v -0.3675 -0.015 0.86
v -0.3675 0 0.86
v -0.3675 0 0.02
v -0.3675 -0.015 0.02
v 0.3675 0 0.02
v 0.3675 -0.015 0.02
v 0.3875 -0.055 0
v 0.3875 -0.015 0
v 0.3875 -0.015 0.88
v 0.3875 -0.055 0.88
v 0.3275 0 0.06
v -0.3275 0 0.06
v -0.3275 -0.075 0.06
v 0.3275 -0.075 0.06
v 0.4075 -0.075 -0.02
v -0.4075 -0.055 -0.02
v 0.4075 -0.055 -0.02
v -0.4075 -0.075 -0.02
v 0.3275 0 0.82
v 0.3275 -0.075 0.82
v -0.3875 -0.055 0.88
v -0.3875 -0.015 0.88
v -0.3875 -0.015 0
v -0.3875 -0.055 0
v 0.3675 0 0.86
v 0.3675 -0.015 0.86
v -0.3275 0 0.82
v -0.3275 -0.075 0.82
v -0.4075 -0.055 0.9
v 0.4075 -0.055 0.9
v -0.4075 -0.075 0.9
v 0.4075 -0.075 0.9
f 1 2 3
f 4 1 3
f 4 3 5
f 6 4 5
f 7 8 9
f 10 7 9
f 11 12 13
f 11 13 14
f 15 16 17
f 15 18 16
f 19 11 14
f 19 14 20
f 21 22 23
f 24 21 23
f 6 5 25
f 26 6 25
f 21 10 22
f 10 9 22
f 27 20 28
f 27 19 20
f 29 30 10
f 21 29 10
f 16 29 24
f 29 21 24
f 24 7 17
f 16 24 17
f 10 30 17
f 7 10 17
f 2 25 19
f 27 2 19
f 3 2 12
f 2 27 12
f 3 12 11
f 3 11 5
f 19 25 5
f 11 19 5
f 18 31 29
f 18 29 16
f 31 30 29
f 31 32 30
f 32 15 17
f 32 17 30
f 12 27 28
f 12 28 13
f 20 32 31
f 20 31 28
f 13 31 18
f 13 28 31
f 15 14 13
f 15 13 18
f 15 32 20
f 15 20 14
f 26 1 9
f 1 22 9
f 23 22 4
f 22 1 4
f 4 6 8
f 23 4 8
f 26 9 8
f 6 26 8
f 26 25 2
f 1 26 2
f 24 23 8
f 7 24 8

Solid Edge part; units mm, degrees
sketch "Sketch1" plane through (0, 0, 0) normal (0, -1, 0) x (1, 0, 0)
  line L0 (-0.3875, 0) -> (0.3875, 0)
  line L1 (0.3875, 0) -> (0.3875, 0.88)
  line L2 (0.3875, 0.88) -> (-0.3875, 0.88)
  line L3 (-0.3875, 0.88) -> (-0.3875, 0)
  dimension "D1" = 0.88
  dimension "D2" = 0.775
extrude "Protrusion1" add sketch "Sketch1" along normal blind 0.075
sketch "Sketch2" plane through (0, 0, 0.69) normal (0, 1, 0) x (-1, 0, 0)
  line L0 (-0.3275, 0.13) -> (0.3275, 0.13)
  line L1 (0.3275, 0.13) -> (0.3275, -0.63)
  line L2 (0.3275, -0.63) -> (-0.3275, -0.63)
  line L3 (-0.3275, -0.63) -> (-0.3275, 0.13)
extrude "Cutout1" cut sketch "Sketch2" against normal up to next
sketch "Sketch3" plane through (0, 0, 0.69) normal (0, 1, 0) x (-1, 0, 0)
  line L0 (-0.3675, -0.67) -> (-0.3675, 0.17)
  line L1 (-0.3675, 0.17) -> (0.3675, 0.17)
  line L2 (0.3675, 0.17) -> (0.3675, -0.67)
  line L3 (0.3675, -0.67) -> (-0.3675, -0.67)
  line L4 (-0.3875, -0.69) -> (-0.3875, 0.19)
  line L5 (-0.3875, 0.19) -> (0.3875, 0.19)
  line L6 (0.3875, 0.19) -> (0.3875, -0.69)
  line L7 (0.3875, -0.69) -> (-0.3875, -0.69)
extrude "Ausschnitt_1" cut sketch "Sketch3" against normal blind 0.015
sketch "Sketch4" plane through (0, -0.075, 0.69) normal (0, -1, 0) x (1, 0, 0)
  line L0 (-0.4075, 0.21) -> (-0.4075, -0.71)
  line L1 (-0.4075, -0.71) -> (0.4075, -0.71)
  line L2 (0.4075, -0.71) -> (0.4075, 0.21)
  line L3 (0.4075, 0.21) -> (-0.4075, 0.21)
  line L4 (0.3875, 0.19) -> (-0.3875, 0.19)
  line L5 (-0.3875, 0.19) -> (-0.3875, -0.69)
  line L6 (-0.3875, -0.69) -> (0.3875, -0.69)
  line L7 (0.3875, -0.69) -> (0.3875, 0.19)
extrude "Ausprägung_2" add sketch "Sketch4" against normal blind 0.02
